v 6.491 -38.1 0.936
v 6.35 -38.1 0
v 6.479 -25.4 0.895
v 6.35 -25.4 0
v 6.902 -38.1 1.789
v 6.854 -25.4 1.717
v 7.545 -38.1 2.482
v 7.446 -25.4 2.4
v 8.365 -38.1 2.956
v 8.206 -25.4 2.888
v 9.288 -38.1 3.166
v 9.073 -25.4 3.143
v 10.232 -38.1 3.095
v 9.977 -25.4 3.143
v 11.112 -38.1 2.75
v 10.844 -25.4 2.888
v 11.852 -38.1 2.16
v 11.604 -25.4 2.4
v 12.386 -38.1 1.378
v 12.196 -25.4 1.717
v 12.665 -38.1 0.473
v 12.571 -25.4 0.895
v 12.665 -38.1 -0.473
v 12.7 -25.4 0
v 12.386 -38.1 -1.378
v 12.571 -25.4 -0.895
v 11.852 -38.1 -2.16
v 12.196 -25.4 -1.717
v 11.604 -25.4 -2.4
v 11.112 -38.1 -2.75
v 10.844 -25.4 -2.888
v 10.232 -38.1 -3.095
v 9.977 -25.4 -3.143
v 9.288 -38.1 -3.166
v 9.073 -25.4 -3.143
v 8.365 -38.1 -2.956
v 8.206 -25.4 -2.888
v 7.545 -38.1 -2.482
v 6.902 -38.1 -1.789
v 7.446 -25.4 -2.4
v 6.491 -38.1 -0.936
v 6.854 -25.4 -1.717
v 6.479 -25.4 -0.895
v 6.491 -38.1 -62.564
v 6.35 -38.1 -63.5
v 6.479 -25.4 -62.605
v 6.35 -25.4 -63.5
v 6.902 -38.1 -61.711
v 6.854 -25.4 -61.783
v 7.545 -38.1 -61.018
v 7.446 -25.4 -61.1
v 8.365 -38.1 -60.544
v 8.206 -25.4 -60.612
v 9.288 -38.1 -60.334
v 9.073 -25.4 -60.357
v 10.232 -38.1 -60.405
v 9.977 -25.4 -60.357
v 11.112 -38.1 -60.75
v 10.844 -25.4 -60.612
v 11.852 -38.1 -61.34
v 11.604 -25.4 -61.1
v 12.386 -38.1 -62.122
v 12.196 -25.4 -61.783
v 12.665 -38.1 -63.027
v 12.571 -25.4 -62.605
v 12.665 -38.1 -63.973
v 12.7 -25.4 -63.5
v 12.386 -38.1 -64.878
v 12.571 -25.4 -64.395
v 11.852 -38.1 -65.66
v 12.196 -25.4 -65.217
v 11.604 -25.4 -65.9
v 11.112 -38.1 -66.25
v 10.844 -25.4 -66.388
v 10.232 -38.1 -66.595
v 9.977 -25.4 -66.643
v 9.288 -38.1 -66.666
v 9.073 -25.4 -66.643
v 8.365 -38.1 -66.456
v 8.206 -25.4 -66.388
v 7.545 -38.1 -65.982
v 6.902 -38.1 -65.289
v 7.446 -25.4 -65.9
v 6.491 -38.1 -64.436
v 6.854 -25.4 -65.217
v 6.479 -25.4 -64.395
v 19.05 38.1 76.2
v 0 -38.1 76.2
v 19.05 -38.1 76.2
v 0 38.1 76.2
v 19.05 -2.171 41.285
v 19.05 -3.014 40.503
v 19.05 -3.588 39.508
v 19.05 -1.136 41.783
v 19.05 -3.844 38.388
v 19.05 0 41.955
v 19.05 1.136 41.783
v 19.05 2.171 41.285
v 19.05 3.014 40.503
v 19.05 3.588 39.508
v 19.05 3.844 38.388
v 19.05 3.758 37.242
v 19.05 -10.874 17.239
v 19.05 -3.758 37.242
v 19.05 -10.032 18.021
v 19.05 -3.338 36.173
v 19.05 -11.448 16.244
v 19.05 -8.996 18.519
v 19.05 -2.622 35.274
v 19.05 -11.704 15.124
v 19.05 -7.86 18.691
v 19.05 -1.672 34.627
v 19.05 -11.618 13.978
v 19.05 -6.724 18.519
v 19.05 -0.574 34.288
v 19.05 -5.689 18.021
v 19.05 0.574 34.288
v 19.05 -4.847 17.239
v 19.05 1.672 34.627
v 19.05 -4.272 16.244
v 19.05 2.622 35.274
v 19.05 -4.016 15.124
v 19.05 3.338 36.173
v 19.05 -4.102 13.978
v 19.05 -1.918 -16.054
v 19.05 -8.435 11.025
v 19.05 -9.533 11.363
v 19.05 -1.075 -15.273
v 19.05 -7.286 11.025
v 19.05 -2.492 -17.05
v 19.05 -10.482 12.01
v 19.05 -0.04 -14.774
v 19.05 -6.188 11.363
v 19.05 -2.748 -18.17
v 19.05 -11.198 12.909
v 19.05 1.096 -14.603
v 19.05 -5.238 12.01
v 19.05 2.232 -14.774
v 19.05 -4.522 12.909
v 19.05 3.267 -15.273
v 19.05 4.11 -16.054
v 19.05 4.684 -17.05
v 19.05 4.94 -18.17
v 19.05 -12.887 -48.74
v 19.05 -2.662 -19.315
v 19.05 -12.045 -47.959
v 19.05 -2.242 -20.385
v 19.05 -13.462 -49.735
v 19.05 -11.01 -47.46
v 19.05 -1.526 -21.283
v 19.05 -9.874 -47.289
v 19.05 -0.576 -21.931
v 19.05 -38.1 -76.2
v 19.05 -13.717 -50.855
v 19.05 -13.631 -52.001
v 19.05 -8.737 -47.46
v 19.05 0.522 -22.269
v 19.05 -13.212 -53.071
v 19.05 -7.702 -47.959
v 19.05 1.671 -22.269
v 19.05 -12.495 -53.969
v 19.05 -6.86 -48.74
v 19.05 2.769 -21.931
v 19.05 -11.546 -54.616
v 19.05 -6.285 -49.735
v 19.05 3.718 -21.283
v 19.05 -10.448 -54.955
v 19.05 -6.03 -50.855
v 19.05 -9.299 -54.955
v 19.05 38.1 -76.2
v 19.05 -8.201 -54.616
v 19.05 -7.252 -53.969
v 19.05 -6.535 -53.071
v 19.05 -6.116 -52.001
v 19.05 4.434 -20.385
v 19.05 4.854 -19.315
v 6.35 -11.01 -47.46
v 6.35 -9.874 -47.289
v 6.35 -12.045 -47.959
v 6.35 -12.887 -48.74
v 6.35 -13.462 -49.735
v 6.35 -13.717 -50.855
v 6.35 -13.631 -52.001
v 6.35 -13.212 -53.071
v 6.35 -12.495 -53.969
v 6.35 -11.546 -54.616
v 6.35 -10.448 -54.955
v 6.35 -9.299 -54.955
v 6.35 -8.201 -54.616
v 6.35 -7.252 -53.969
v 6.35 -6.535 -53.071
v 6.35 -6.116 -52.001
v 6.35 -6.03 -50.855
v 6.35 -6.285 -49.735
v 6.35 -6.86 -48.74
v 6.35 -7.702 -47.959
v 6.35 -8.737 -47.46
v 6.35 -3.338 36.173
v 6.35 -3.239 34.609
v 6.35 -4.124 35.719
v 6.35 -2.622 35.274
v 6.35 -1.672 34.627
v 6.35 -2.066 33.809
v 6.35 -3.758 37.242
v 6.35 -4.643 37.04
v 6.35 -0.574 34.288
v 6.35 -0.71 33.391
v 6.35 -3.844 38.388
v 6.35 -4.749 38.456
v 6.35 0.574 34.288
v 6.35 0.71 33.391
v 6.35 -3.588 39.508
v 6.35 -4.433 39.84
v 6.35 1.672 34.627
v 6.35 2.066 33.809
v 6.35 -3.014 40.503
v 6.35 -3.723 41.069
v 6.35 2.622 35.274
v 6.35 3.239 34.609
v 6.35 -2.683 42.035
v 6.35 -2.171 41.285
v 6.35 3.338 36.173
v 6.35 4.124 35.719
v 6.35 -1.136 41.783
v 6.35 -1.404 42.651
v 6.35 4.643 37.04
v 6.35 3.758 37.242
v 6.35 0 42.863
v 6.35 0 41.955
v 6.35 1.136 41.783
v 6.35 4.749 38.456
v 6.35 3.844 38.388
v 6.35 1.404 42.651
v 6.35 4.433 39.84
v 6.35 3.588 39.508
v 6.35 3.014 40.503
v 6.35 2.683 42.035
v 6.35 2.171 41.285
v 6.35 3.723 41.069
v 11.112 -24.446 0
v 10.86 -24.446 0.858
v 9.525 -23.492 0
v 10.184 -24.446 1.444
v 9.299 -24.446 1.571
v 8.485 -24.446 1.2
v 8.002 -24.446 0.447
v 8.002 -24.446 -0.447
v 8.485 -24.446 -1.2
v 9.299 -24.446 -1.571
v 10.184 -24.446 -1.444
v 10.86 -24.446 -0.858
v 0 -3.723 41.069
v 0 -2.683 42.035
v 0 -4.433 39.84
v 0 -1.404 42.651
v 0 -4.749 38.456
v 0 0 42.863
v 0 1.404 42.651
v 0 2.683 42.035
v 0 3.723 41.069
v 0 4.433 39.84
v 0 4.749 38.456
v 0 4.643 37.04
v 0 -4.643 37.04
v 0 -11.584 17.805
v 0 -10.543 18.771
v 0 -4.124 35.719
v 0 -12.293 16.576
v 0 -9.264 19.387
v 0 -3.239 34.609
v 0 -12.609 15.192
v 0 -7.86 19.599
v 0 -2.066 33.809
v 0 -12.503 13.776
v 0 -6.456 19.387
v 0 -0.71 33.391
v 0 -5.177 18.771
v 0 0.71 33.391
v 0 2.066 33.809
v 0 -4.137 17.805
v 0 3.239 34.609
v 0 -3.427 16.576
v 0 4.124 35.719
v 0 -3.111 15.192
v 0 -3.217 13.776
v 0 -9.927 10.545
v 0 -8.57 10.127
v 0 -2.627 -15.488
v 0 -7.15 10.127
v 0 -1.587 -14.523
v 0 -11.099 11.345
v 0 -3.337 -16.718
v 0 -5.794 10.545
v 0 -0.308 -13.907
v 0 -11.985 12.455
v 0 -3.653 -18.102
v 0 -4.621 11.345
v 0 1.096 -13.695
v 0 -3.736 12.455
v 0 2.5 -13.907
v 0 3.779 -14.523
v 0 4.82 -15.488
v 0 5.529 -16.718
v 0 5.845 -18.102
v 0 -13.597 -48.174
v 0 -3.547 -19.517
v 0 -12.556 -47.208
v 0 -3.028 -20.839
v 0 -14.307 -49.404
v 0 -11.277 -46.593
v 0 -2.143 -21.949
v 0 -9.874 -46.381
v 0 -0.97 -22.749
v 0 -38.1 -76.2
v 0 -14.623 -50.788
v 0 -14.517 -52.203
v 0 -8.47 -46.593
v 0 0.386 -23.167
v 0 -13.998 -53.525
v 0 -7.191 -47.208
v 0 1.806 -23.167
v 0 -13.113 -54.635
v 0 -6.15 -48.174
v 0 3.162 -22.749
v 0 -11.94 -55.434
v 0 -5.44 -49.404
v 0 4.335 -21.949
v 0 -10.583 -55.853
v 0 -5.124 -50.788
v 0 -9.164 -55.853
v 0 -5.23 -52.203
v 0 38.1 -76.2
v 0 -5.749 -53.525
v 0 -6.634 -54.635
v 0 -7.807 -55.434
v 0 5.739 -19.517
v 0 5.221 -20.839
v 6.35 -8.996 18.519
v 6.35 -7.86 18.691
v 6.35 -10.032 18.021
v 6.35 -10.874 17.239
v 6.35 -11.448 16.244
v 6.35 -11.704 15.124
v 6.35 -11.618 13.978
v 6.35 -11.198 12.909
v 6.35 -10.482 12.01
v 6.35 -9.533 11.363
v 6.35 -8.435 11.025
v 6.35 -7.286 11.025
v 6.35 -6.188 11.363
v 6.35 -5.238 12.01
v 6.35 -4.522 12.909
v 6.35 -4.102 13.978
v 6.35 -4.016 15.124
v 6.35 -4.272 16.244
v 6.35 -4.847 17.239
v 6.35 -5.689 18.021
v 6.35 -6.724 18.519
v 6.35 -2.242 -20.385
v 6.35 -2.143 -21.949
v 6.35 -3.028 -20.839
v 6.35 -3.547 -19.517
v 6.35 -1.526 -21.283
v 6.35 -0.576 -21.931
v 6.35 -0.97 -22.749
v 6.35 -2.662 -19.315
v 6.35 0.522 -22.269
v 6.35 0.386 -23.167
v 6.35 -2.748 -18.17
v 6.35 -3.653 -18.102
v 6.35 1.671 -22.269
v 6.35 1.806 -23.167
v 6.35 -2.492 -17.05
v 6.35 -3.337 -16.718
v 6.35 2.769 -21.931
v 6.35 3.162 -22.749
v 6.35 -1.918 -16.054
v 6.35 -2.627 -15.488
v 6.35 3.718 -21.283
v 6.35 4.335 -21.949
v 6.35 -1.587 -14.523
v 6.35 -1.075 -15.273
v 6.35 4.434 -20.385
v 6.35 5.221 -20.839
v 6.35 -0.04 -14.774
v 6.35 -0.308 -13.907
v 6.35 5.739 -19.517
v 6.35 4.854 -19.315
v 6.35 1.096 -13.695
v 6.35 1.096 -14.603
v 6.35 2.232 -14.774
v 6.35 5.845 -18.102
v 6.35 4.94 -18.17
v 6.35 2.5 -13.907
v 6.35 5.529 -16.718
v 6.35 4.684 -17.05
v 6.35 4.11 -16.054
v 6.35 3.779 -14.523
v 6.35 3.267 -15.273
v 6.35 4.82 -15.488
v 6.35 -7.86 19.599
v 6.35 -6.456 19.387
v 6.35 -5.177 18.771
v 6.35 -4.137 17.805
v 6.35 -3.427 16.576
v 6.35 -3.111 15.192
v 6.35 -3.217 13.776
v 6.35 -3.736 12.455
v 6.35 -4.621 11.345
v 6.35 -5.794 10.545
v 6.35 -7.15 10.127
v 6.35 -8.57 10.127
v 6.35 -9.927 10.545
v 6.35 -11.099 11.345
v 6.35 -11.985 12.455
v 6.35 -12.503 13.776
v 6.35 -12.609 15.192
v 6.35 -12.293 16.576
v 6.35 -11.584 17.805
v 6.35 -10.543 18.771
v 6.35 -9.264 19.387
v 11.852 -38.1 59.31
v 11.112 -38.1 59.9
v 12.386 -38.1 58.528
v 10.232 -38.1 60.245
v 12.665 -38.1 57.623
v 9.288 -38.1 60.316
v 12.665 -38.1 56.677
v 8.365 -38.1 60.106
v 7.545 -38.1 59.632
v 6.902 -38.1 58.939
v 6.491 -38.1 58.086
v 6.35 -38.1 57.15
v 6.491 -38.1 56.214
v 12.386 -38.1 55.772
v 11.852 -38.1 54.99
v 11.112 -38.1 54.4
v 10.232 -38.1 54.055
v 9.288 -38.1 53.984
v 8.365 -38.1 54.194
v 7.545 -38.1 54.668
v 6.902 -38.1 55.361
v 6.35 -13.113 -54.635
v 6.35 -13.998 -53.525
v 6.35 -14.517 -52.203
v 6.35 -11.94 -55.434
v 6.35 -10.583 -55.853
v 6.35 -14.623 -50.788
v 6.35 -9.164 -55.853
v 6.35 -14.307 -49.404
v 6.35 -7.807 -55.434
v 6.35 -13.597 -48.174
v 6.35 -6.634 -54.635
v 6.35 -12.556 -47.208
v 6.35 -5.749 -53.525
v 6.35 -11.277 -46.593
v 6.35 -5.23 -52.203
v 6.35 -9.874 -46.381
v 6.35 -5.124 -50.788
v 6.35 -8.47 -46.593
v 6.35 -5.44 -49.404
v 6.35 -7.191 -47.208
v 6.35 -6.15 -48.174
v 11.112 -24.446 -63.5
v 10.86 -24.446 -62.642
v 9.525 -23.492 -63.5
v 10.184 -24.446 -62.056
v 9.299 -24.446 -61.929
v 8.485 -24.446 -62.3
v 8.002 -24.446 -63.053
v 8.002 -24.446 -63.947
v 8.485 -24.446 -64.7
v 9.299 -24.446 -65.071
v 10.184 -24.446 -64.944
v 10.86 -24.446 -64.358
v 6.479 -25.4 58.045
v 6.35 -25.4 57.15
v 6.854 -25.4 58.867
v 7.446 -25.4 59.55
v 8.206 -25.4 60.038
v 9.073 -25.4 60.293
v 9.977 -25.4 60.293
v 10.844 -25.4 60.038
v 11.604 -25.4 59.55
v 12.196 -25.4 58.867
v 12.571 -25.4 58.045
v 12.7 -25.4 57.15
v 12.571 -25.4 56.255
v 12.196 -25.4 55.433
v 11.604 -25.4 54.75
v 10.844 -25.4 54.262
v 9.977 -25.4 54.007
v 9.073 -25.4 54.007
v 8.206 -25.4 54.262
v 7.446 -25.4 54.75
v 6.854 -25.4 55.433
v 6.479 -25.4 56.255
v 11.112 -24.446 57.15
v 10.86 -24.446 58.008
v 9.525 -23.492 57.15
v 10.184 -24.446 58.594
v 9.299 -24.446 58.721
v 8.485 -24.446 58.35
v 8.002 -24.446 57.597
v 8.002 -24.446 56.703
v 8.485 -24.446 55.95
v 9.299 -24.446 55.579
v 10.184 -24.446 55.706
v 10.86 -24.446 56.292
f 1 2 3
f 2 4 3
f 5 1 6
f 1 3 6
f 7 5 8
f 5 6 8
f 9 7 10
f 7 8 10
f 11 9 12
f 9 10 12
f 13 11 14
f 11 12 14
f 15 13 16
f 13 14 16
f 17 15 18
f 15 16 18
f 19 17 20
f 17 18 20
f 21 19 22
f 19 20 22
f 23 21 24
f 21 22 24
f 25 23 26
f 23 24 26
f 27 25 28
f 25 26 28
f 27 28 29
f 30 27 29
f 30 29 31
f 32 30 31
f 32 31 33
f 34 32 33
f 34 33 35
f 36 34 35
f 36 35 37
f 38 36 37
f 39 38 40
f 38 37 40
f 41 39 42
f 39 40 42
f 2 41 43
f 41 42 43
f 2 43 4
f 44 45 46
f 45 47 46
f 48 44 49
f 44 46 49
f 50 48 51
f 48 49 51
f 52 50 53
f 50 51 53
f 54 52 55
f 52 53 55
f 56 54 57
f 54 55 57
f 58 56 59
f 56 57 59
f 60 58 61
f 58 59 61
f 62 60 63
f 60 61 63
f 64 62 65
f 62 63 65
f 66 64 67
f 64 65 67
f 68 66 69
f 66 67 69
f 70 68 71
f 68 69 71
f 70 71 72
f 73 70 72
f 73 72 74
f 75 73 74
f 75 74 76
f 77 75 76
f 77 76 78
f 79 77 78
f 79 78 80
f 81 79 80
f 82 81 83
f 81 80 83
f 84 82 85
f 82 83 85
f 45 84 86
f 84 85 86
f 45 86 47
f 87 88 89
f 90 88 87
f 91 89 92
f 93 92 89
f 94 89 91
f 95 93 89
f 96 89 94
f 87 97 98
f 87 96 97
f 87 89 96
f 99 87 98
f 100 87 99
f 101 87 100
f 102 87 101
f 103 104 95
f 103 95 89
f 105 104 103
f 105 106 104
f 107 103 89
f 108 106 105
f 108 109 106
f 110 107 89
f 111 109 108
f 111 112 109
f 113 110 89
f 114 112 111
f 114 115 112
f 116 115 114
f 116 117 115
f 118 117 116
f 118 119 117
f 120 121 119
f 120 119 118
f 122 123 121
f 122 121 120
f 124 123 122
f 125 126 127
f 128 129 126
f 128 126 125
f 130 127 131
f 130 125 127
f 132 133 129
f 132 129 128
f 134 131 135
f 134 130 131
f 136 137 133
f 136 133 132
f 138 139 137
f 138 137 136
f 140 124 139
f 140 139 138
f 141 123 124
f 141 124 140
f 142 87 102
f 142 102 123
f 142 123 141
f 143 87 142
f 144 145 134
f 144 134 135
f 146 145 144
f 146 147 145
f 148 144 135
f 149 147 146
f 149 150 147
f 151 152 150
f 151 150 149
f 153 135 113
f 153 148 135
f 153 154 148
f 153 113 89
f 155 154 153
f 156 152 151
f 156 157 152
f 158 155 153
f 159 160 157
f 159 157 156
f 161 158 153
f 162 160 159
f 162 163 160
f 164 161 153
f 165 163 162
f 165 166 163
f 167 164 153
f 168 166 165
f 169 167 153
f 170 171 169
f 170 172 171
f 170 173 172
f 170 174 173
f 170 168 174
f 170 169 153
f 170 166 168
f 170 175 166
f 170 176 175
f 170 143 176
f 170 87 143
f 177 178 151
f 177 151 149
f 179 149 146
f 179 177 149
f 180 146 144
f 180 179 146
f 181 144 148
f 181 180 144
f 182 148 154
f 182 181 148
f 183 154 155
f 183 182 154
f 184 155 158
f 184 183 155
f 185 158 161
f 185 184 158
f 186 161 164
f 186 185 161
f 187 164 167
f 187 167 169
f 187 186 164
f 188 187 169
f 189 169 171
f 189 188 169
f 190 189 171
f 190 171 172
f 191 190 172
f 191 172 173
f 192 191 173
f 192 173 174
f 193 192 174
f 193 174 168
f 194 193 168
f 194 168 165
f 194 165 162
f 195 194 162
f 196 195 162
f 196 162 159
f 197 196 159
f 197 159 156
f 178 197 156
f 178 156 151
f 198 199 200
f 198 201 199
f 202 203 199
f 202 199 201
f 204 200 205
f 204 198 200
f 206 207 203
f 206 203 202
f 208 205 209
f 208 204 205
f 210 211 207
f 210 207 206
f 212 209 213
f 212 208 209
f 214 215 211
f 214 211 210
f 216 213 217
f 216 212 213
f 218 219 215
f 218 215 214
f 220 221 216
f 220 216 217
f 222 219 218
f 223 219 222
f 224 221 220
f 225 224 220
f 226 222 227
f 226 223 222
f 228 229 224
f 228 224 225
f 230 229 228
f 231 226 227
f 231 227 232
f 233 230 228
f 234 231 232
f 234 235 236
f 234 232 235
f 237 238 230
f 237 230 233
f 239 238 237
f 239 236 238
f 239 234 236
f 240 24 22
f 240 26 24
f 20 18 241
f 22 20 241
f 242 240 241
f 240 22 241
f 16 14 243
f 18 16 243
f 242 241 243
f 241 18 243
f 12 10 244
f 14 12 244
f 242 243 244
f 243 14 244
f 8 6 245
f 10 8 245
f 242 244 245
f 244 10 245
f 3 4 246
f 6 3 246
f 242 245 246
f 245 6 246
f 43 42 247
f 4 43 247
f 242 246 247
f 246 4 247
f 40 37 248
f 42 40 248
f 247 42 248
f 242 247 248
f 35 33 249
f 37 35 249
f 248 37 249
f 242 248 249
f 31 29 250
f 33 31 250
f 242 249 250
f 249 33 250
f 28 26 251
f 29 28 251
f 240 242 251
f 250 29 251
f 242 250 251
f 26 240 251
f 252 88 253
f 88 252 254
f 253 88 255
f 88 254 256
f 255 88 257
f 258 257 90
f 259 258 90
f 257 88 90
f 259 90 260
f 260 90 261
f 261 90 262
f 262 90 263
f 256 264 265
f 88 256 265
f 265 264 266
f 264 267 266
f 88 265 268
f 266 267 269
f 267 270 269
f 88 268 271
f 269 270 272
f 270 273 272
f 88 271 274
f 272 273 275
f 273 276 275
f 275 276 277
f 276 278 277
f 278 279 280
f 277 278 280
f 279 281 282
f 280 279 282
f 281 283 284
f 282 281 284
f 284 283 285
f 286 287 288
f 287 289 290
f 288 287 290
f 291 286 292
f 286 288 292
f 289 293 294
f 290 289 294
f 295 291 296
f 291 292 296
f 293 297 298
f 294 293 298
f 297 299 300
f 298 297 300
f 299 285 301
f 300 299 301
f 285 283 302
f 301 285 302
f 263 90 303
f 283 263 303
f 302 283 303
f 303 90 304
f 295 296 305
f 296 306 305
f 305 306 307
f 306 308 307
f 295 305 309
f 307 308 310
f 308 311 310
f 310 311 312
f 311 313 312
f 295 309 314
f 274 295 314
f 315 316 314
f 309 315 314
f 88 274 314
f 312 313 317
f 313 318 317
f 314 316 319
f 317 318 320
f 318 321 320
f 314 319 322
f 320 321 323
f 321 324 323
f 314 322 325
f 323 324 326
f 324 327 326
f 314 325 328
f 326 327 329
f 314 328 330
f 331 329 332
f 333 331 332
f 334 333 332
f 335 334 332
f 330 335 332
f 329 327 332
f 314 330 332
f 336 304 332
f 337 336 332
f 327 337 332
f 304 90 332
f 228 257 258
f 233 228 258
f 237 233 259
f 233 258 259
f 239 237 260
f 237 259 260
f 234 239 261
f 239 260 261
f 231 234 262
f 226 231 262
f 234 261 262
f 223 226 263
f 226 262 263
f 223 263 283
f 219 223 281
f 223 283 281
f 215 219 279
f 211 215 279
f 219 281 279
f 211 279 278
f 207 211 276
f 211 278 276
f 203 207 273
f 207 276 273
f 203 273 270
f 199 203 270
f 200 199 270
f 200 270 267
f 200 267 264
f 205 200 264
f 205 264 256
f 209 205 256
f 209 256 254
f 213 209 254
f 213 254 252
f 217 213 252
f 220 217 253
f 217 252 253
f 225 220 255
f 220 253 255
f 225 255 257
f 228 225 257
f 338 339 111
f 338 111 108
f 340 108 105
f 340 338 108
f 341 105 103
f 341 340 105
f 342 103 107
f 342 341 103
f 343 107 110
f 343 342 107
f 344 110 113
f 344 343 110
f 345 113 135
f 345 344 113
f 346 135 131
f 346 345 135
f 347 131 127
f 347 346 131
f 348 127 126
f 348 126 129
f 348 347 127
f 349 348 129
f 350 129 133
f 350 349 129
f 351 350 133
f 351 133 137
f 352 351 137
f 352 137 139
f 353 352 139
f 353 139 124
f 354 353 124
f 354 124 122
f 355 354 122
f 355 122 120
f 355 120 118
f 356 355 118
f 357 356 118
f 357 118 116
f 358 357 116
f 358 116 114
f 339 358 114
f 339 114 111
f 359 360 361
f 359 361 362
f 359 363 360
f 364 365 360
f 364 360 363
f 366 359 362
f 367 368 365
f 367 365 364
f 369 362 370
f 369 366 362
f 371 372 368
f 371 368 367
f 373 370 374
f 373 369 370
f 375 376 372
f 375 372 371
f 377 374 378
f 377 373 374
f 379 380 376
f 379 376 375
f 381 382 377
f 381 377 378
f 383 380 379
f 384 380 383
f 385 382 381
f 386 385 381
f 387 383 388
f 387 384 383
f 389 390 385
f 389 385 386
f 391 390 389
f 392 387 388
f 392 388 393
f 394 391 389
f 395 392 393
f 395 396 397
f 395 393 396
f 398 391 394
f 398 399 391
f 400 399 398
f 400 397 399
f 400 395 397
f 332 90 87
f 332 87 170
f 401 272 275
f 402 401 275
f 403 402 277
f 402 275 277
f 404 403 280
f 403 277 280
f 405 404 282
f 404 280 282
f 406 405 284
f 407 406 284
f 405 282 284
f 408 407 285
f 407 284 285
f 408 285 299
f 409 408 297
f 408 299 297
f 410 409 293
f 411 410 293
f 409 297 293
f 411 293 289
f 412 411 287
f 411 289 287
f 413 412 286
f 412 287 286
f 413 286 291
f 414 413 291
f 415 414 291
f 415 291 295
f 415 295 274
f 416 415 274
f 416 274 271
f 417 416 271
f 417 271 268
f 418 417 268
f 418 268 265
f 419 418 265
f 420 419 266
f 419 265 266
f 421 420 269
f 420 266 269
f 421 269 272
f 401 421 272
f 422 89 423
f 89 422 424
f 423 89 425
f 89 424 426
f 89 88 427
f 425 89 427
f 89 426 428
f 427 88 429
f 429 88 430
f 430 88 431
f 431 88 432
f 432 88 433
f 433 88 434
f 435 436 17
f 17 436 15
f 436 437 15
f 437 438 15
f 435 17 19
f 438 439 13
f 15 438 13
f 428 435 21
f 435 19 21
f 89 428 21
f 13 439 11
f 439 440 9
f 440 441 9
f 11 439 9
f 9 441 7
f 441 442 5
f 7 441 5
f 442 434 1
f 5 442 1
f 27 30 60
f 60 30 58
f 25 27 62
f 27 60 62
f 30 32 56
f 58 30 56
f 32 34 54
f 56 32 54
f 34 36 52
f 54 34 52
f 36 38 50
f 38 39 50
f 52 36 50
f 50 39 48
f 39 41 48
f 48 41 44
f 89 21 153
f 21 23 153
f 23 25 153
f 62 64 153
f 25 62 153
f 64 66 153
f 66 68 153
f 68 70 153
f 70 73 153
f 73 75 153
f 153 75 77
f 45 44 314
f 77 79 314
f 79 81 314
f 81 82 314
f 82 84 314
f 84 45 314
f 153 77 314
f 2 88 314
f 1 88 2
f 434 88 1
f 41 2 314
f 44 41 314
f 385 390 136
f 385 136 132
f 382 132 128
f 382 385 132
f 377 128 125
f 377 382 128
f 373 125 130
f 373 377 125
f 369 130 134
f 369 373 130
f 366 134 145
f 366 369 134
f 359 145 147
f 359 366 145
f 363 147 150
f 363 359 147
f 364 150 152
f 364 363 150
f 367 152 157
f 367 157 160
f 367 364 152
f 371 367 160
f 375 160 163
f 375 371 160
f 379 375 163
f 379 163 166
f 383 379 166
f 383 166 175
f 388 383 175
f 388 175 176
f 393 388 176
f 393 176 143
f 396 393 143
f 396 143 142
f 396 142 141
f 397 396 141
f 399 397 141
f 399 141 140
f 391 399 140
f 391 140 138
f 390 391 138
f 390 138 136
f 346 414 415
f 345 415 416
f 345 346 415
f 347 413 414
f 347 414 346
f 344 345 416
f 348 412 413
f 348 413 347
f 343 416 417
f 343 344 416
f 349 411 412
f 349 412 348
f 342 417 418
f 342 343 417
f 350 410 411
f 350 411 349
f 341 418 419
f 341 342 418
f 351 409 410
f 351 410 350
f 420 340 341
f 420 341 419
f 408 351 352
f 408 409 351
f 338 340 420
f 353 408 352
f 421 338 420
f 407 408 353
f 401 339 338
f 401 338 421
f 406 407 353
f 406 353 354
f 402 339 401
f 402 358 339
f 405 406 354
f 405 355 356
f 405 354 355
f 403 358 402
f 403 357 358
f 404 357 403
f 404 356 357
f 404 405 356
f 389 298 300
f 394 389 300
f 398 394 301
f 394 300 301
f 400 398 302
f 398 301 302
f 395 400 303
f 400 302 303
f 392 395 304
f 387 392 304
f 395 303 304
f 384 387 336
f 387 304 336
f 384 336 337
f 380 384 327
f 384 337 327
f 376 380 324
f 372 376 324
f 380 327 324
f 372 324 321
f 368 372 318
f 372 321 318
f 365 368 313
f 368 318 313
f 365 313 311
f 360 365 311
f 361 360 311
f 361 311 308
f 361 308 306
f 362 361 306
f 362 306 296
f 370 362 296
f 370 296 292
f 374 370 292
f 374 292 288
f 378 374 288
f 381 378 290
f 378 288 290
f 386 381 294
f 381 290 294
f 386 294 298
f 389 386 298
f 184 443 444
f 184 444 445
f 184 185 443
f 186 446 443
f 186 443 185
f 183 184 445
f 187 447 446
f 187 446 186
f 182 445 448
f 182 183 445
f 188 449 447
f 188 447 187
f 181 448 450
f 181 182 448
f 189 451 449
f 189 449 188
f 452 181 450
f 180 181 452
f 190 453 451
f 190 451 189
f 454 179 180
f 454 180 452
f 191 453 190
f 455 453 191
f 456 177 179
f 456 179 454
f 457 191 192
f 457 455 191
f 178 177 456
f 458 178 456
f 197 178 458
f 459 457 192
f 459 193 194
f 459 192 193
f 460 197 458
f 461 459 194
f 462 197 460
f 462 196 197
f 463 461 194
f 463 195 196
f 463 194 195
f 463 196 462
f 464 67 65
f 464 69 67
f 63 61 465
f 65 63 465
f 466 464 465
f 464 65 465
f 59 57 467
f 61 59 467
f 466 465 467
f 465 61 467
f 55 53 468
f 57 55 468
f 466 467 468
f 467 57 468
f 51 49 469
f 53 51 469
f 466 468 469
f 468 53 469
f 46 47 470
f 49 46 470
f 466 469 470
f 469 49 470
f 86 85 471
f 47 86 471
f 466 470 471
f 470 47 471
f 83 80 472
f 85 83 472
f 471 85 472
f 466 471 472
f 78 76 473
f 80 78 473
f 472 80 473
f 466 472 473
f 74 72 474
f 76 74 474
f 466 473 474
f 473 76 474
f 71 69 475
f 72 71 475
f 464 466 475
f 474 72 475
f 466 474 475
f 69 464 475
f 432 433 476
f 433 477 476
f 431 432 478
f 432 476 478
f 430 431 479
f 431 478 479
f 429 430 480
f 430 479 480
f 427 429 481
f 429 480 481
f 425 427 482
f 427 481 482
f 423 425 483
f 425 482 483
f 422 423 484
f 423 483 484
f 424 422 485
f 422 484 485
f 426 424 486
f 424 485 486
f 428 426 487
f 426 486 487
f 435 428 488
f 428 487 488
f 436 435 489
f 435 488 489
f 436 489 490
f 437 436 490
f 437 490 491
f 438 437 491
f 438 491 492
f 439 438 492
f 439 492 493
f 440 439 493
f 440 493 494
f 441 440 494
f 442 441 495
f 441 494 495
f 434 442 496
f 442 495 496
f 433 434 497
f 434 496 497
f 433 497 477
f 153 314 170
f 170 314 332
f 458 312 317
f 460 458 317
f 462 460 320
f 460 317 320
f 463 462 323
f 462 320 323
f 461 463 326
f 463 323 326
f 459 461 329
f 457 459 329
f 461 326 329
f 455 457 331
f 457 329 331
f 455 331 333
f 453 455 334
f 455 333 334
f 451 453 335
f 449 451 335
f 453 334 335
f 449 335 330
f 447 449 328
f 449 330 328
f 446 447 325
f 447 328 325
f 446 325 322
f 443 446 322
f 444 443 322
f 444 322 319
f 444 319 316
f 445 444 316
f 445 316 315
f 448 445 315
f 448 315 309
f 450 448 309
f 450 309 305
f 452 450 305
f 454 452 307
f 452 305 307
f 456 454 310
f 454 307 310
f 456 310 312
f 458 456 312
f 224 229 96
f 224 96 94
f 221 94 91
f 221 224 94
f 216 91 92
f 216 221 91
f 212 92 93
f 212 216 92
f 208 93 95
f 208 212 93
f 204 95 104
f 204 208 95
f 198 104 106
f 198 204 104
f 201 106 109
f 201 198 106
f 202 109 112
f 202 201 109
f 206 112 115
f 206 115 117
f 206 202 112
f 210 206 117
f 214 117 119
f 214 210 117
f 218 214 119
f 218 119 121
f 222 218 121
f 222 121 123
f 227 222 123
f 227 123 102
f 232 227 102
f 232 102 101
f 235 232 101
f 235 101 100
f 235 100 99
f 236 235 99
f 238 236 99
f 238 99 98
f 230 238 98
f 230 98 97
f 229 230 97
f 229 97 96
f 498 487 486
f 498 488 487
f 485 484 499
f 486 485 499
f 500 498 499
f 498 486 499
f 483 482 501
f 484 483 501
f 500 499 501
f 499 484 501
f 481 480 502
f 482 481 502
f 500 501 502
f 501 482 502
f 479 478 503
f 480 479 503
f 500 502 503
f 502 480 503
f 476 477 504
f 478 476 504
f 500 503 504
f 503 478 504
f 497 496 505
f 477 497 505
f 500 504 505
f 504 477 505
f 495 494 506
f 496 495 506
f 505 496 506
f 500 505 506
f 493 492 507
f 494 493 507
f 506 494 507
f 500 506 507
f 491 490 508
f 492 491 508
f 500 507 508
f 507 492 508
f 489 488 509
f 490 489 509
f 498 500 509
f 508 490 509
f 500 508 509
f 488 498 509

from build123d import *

# Parameters (mm, degrees)
SKETCH1_R                       = 3.854557775
BOSS_EXTRUDE1_DEPTH             = 19.05
F_1_4_0_25_DIAMETER_HOLE2_D     = 6.35
F_1_4_0_25_DIAMETER_HOLE2_DEPTH = 12.7
F_1_4_0_25_DIAMETER_HOLE2_TIP   = 1.907732465
SKETCH2_R                       = 4.7625
CUT_EXTRUDE1_DEPTH              = 6.35


with BuildPart() as part:
    # Sketch1 → Boss-Extrude1 (new body)
    # profile 1 of 2: a face of its own
    with BuildSketch(Plane(origin=(0, 0, 0), x_dir=(0, 0, -1), z_dir=(1, 0, 0))):
        with BuildLine():
            Line((-76.2, 38.1), (-76.2, 0))
            Line((-76.2, 0), (-41.954557775, 0))
            ThreePointArc((-41.954557775, 0), (-38.1, 3.854557775), (-34.245442225, 0))
            Line((-34.245442225, 0), (14.762299925, 0))
            ThreePointArc((14.762299925, 0), (17.903949731, 4.910646748), (22.312291357, 1.096077429))
            ThreePointArc((22.312291357, 1.096077429), (22.272302901, 0.542293578), (22.153167239, 0))
            Line((22.153167239, 0), (76.2, 0))
            Line((76.2, 0), (76.2, 38.1))
            Line((76.2, 38.1), (-76.2, 38.1))
        make_face()
    # profile 2 of 2: a face of its own
    with BuildSketch(Plane(origin=(0, 0, 0), x_dir=(0, 0, -1), z_dir=(1, 0, 0))):
        with BuildLine():
            Line((-41.954557775, 0), (-76.2, 0))
            Line((-76.2, 0), (-76.2, -38.1))
            Line((-76.2, -38.1), (76.2, -38.1))
            Line((76.2, -38.1), (76.2, 0))
            Line((76.2, 0), (22.153167239, 0))
            ThreePointArc((22.153167239, 0), (18.457733582, -2.758480346), (14.762299925, 0))
            Line((14.762299925, 0), (-34.245442225, 0))
            ThreePointArc((-34.245442225, 0), (-38.1, -3.854557775), (-41.954557775, 0))
        make_face()
        with Locations((-14.836022013, -7.860160654)):
            Circle(SKETCH1_R, mode=Mode.SUBTRACT)
        with Locations((51.143457994, -9.873506971)):
            Circle(SKETCH1_R, mode=Mode.SUBTRACT)
    extrude(amount=BOSS_EXTRUDE1_DEPTH)

    # 1/4 (0.25) Diameter Hole2
    with Locations(Plane.XZ.offset(38.1)):
        with Locations((9.525, 57.15), (9.525, -63.5), (9.525, 0)):
            Hole(F_1_4_0_25_DIAMETER_HOLE2_D / 2, depth=F_1_4_0_25_DIAMETER_HOLE2_DEPTH)
            with Locations((0, 0, -(F_1_4_0_25_DIAMETER_HOLE2_DEPTH + F_1_4_0_25_DIAMETER_HOLE2_TIP / 2))):  # 118° drill point
                Cone(0, F_1_4_0_25_DIAMETER_HOLE2_D / 2, F_1_4_0_25_DIAMETER_HOLE2_TIP, mode=Mode.SUBTRACT)

    # Sketch2 → Cut-Extrude1 (cut)
    with BuildSketch(Plane.ZY):
        with Locations((38.1, 0)):
            Circle(SKETCH2_R)
        with Locations((14.836022013, -7.860160654)):
            Circle(SKETCH2_R)
        with Locations((-18.457733582, 1.096077429)):
            Circle(SKETCH2_R)
        with Locations((-51.143457994, -9.873506971)):
            Circle(SKETCH2_R)
    extrude(amount=-CUT_EXTRUDE1_DEPTH, mode=Mode.SUBTRACT)


solid = part.part
